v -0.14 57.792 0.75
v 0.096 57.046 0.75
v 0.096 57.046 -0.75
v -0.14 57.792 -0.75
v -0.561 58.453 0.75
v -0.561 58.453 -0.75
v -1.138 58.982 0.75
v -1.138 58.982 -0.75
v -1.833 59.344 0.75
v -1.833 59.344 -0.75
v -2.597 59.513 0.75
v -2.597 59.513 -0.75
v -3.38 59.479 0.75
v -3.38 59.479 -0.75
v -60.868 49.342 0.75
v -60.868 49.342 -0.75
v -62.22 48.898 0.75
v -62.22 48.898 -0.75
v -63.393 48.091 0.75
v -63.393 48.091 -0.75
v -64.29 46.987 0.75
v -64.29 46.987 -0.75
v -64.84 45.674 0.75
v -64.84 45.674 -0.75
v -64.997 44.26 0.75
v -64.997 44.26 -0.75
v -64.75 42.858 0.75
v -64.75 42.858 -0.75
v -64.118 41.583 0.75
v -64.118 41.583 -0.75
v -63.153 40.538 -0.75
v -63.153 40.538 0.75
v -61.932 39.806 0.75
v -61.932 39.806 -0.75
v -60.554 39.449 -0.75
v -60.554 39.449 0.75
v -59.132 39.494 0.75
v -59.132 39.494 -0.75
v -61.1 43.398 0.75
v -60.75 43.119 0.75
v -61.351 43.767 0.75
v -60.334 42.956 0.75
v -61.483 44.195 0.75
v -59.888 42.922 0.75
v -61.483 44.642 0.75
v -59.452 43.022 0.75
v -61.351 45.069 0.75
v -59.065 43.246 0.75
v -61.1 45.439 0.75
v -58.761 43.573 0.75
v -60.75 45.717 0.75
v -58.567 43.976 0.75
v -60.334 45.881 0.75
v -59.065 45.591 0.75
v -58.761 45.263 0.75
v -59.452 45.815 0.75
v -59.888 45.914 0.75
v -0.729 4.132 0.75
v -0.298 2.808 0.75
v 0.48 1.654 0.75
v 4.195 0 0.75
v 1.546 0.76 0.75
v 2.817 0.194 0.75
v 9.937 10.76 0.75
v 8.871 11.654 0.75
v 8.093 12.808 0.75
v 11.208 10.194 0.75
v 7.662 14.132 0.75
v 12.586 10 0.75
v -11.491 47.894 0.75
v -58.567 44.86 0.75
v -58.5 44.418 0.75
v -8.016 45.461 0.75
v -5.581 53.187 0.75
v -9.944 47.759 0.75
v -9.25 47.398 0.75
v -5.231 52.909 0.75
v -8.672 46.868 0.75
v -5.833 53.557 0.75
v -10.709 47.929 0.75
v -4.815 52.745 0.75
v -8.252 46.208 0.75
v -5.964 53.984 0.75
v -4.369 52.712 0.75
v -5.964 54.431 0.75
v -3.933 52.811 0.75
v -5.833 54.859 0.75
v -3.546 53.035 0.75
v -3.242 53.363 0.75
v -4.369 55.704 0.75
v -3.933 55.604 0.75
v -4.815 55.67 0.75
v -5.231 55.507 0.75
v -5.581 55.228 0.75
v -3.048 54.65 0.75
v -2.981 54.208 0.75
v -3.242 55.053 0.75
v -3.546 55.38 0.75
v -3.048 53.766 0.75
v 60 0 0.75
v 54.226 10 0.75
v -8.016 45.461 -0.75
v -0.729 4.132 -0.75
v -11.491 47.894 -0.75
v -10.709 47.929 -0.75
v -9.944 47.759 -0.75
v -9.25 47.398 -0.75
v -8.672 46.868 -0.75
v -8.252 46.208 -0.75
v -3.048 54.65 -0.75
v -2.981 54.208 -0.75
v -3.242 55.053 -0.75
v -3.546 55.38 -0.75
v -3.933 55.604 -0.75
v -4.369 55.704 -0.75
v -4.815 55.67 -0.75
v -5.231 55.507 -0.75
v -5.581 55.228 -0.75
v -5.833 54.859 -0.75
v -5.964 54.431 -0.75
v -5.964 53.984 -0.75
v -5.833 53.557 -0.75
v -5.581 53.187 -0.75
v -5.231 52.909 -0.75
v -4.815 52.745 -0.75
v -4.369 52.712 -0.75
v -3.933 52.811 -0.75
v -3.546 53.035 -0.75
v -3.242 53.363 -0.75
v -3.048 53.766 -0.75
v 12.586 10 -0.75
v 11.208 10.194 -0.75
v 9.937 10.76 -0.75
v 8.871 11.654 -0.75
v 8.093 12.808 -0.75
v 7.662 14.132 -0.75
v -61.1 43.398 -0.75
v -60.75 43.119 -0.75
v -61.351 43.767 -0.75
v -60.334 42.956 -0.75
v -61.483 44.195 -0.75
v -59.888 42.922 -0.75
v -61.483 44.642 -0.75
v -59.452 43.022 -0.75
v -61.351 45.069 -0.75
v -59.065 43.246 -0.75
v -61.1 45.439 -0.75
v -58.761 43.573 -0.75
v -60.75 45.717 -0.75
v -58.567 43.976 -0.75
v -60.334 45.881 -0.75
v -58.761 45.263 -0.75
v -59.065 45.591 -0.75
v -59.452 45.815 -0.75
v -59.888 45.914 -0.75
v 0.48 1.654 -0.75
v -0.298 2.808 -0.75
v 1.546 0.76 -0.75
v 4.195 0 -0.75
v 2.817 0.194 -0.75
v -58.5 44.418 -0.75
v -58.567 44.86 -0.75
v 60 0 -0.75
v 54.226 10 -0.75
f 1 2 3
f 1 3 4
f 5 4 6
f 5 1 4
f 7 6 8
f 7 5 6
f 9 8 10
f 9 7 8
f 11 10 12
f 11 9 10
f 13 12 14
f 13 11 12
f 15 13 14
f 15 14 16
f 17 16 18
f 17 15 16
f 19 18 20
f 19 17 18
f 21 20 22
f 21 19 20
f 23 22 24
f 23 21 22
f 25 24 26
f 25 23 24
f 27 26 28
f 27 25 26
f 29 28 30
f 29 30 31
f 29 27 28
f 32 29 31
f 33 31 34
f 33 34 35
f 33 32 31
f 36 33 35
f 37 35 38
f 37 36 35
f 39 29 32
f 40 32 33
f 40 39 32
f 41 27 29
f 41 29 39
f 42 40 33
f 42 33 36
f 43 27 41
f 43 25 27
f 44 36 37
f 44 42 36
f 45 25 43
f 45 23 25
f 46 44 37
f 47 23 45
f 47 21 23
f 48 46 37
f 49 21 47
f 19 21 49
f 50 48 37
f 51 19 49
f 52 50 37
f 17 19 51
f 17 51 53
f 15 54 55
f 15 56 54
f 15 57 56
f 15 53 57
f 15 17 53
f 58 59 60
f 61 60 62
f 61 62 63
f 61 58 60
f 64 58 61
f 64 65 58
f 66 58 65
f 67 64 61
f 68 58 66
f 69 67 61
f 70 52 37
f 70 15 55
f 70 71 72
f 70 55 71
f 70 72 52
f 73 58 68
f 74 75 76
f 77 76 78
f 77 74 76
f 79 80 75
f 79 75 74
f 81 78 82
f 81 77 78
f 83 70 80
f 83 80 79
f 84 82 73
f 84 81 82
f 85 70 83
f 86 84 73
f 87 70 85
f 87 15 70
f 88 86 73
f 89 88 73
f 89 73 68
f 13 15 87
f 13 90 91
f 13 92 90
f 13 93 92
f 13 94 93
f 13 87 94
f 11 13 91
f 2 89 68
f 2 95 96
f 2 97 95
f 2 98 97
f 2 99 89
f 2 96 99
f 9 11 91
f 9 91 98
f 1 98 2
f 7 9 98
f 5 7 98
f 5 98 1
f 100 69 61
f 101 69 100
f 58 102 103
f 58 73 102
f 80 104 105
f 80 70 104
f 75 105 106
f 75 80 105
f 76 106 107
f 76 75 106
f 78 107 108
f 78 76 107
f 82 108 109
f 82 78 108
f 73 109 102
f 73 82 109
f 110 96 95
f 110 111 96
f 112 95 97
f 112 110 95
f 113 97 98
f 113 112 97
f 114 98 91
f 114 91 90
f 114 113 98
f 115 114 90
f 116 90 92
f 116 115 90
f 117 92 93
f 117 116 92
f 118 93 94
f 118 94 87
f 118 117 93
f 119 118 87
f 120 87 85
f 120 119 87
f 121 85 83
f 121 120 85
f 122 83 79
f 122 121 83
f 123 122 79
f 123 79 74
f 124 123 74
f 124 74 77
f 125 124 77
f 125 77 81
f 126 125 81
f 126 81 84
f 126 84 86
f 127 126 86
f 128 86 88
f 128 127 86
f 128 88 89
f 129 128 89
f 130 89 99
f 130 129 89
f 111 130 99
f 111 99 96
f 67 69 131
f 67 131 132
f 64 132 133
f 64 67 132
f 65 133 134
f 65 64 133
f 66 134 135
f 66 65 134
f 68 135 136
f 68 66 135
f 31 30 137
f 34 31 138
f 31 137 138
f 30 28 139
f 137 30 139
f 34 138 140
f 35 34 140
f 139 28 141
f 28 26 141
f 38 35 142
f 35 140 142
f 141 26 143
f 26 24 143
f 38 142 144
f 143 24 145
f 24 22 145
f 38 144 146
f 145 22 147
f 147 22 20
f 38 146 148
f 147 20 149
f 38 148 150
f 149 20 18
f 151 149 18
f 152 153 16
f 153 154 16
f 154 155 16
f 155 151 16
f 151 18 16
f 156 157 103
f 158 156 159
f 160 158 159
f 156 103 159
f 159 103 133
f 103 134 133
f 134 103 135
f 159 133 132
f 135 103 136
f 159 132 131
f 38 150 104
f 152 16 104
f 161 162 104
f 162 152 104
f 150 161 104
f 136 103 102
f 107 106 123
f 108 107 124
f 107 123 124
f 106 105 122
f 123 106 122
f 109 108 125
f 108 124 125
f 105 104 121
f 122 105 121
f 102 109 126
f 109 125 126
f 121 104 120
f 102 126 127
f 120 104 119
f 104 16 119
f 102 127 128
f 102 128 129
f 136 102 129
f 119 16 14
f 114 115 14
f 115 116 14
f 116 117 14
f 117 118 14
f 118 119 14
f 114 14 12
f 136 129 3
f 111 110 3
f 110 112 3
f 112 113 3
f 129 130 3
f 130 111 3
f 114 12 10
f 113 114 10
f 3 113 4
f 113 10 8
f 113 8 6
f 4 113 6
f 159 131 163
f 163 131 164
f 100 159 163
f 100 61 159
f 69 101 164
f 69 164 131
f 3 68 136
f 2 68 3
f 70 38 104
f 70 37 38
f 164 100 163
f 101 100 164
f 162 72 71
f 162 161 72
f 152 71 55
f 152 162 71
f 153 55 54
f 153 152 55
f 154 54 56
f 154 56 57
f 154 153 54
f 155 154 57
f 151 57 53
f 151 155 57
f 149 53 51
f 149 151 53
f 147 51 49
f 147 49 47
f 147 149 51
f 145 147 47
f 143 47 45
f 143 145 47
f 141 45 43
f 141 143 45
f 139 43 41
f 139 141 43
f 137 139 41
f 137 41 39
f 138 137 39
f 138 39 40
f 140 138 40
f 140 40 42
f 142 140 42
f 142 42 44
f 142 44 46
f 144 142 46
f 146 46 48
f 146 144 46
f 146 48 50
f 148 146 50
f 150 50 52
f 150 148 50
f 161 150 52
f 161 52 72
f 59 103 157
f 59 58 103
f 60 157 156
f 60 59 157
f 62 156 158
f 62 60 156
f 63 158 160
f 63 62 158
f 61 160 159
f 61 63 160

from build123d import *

# Parameters (mm, degrees)
SKETCH1_R           = 1.5
BOSS_EXTRUDE1_DEPTH = 0.75


with BuildPart() as part:
    # Sketch1 → Boss-Extrude1 (new body, symmetric)
    with BuildSketch(Plane.XY):
        with BuildLine():
            Line((4.195498156, 0), (60, 0))
            Line((60, 0), (54.226497308, 10))
            Line((54.226497308, 10), (12.586494468, 10))
            ThreePointArc((12.586494468, 10), (9.372556419, 11.169777784), (7.662455703, 14.131759112))
            Line((7.662455703, 14.131759112), (0.095591809, 57.045576741))
            ThreePointArc((0.095591809, 57.045576741), (-1.138102141, 58.982088341), (-3.379775983, 59.479055467))
            Line((-3.379775983, 59.479055467), (-60.868240888, 49.342288025))
            ThreePointArc((-60.868240888, 49.342288025), (-64.924038765, 43.550008371), (-59.131759112, 39.494210494))
            Line((-59.131759112, 39.494210494), (-11.491371736, 47.89449616))
            ThreePointArc((-11.491371736, 47.89449616), (-9.249697894, 47.397529034), (-8.016003944, 45.461017434))
            Line((-8.016003944, 45.461017434), (-0.728540609, 4.131759112))
            ThreePointArc((-0.728540609, 4.131759112), (0.981560107, 1.169777784), (4.195498156, 0))
        make_face()
        with Locations((-60, 44.41824926)):
            Circle(SKETCH1_R, mode=Mode.SUBTRACT)
        with Locations((-4.4811506, 54.207720347)):
            Circle(SKETCH1_R, mode=Mode.SUBTRACT)
    extrude(amount=BOSS_EXTRUDE1_DEPTH, both=True)


solid = part.part
